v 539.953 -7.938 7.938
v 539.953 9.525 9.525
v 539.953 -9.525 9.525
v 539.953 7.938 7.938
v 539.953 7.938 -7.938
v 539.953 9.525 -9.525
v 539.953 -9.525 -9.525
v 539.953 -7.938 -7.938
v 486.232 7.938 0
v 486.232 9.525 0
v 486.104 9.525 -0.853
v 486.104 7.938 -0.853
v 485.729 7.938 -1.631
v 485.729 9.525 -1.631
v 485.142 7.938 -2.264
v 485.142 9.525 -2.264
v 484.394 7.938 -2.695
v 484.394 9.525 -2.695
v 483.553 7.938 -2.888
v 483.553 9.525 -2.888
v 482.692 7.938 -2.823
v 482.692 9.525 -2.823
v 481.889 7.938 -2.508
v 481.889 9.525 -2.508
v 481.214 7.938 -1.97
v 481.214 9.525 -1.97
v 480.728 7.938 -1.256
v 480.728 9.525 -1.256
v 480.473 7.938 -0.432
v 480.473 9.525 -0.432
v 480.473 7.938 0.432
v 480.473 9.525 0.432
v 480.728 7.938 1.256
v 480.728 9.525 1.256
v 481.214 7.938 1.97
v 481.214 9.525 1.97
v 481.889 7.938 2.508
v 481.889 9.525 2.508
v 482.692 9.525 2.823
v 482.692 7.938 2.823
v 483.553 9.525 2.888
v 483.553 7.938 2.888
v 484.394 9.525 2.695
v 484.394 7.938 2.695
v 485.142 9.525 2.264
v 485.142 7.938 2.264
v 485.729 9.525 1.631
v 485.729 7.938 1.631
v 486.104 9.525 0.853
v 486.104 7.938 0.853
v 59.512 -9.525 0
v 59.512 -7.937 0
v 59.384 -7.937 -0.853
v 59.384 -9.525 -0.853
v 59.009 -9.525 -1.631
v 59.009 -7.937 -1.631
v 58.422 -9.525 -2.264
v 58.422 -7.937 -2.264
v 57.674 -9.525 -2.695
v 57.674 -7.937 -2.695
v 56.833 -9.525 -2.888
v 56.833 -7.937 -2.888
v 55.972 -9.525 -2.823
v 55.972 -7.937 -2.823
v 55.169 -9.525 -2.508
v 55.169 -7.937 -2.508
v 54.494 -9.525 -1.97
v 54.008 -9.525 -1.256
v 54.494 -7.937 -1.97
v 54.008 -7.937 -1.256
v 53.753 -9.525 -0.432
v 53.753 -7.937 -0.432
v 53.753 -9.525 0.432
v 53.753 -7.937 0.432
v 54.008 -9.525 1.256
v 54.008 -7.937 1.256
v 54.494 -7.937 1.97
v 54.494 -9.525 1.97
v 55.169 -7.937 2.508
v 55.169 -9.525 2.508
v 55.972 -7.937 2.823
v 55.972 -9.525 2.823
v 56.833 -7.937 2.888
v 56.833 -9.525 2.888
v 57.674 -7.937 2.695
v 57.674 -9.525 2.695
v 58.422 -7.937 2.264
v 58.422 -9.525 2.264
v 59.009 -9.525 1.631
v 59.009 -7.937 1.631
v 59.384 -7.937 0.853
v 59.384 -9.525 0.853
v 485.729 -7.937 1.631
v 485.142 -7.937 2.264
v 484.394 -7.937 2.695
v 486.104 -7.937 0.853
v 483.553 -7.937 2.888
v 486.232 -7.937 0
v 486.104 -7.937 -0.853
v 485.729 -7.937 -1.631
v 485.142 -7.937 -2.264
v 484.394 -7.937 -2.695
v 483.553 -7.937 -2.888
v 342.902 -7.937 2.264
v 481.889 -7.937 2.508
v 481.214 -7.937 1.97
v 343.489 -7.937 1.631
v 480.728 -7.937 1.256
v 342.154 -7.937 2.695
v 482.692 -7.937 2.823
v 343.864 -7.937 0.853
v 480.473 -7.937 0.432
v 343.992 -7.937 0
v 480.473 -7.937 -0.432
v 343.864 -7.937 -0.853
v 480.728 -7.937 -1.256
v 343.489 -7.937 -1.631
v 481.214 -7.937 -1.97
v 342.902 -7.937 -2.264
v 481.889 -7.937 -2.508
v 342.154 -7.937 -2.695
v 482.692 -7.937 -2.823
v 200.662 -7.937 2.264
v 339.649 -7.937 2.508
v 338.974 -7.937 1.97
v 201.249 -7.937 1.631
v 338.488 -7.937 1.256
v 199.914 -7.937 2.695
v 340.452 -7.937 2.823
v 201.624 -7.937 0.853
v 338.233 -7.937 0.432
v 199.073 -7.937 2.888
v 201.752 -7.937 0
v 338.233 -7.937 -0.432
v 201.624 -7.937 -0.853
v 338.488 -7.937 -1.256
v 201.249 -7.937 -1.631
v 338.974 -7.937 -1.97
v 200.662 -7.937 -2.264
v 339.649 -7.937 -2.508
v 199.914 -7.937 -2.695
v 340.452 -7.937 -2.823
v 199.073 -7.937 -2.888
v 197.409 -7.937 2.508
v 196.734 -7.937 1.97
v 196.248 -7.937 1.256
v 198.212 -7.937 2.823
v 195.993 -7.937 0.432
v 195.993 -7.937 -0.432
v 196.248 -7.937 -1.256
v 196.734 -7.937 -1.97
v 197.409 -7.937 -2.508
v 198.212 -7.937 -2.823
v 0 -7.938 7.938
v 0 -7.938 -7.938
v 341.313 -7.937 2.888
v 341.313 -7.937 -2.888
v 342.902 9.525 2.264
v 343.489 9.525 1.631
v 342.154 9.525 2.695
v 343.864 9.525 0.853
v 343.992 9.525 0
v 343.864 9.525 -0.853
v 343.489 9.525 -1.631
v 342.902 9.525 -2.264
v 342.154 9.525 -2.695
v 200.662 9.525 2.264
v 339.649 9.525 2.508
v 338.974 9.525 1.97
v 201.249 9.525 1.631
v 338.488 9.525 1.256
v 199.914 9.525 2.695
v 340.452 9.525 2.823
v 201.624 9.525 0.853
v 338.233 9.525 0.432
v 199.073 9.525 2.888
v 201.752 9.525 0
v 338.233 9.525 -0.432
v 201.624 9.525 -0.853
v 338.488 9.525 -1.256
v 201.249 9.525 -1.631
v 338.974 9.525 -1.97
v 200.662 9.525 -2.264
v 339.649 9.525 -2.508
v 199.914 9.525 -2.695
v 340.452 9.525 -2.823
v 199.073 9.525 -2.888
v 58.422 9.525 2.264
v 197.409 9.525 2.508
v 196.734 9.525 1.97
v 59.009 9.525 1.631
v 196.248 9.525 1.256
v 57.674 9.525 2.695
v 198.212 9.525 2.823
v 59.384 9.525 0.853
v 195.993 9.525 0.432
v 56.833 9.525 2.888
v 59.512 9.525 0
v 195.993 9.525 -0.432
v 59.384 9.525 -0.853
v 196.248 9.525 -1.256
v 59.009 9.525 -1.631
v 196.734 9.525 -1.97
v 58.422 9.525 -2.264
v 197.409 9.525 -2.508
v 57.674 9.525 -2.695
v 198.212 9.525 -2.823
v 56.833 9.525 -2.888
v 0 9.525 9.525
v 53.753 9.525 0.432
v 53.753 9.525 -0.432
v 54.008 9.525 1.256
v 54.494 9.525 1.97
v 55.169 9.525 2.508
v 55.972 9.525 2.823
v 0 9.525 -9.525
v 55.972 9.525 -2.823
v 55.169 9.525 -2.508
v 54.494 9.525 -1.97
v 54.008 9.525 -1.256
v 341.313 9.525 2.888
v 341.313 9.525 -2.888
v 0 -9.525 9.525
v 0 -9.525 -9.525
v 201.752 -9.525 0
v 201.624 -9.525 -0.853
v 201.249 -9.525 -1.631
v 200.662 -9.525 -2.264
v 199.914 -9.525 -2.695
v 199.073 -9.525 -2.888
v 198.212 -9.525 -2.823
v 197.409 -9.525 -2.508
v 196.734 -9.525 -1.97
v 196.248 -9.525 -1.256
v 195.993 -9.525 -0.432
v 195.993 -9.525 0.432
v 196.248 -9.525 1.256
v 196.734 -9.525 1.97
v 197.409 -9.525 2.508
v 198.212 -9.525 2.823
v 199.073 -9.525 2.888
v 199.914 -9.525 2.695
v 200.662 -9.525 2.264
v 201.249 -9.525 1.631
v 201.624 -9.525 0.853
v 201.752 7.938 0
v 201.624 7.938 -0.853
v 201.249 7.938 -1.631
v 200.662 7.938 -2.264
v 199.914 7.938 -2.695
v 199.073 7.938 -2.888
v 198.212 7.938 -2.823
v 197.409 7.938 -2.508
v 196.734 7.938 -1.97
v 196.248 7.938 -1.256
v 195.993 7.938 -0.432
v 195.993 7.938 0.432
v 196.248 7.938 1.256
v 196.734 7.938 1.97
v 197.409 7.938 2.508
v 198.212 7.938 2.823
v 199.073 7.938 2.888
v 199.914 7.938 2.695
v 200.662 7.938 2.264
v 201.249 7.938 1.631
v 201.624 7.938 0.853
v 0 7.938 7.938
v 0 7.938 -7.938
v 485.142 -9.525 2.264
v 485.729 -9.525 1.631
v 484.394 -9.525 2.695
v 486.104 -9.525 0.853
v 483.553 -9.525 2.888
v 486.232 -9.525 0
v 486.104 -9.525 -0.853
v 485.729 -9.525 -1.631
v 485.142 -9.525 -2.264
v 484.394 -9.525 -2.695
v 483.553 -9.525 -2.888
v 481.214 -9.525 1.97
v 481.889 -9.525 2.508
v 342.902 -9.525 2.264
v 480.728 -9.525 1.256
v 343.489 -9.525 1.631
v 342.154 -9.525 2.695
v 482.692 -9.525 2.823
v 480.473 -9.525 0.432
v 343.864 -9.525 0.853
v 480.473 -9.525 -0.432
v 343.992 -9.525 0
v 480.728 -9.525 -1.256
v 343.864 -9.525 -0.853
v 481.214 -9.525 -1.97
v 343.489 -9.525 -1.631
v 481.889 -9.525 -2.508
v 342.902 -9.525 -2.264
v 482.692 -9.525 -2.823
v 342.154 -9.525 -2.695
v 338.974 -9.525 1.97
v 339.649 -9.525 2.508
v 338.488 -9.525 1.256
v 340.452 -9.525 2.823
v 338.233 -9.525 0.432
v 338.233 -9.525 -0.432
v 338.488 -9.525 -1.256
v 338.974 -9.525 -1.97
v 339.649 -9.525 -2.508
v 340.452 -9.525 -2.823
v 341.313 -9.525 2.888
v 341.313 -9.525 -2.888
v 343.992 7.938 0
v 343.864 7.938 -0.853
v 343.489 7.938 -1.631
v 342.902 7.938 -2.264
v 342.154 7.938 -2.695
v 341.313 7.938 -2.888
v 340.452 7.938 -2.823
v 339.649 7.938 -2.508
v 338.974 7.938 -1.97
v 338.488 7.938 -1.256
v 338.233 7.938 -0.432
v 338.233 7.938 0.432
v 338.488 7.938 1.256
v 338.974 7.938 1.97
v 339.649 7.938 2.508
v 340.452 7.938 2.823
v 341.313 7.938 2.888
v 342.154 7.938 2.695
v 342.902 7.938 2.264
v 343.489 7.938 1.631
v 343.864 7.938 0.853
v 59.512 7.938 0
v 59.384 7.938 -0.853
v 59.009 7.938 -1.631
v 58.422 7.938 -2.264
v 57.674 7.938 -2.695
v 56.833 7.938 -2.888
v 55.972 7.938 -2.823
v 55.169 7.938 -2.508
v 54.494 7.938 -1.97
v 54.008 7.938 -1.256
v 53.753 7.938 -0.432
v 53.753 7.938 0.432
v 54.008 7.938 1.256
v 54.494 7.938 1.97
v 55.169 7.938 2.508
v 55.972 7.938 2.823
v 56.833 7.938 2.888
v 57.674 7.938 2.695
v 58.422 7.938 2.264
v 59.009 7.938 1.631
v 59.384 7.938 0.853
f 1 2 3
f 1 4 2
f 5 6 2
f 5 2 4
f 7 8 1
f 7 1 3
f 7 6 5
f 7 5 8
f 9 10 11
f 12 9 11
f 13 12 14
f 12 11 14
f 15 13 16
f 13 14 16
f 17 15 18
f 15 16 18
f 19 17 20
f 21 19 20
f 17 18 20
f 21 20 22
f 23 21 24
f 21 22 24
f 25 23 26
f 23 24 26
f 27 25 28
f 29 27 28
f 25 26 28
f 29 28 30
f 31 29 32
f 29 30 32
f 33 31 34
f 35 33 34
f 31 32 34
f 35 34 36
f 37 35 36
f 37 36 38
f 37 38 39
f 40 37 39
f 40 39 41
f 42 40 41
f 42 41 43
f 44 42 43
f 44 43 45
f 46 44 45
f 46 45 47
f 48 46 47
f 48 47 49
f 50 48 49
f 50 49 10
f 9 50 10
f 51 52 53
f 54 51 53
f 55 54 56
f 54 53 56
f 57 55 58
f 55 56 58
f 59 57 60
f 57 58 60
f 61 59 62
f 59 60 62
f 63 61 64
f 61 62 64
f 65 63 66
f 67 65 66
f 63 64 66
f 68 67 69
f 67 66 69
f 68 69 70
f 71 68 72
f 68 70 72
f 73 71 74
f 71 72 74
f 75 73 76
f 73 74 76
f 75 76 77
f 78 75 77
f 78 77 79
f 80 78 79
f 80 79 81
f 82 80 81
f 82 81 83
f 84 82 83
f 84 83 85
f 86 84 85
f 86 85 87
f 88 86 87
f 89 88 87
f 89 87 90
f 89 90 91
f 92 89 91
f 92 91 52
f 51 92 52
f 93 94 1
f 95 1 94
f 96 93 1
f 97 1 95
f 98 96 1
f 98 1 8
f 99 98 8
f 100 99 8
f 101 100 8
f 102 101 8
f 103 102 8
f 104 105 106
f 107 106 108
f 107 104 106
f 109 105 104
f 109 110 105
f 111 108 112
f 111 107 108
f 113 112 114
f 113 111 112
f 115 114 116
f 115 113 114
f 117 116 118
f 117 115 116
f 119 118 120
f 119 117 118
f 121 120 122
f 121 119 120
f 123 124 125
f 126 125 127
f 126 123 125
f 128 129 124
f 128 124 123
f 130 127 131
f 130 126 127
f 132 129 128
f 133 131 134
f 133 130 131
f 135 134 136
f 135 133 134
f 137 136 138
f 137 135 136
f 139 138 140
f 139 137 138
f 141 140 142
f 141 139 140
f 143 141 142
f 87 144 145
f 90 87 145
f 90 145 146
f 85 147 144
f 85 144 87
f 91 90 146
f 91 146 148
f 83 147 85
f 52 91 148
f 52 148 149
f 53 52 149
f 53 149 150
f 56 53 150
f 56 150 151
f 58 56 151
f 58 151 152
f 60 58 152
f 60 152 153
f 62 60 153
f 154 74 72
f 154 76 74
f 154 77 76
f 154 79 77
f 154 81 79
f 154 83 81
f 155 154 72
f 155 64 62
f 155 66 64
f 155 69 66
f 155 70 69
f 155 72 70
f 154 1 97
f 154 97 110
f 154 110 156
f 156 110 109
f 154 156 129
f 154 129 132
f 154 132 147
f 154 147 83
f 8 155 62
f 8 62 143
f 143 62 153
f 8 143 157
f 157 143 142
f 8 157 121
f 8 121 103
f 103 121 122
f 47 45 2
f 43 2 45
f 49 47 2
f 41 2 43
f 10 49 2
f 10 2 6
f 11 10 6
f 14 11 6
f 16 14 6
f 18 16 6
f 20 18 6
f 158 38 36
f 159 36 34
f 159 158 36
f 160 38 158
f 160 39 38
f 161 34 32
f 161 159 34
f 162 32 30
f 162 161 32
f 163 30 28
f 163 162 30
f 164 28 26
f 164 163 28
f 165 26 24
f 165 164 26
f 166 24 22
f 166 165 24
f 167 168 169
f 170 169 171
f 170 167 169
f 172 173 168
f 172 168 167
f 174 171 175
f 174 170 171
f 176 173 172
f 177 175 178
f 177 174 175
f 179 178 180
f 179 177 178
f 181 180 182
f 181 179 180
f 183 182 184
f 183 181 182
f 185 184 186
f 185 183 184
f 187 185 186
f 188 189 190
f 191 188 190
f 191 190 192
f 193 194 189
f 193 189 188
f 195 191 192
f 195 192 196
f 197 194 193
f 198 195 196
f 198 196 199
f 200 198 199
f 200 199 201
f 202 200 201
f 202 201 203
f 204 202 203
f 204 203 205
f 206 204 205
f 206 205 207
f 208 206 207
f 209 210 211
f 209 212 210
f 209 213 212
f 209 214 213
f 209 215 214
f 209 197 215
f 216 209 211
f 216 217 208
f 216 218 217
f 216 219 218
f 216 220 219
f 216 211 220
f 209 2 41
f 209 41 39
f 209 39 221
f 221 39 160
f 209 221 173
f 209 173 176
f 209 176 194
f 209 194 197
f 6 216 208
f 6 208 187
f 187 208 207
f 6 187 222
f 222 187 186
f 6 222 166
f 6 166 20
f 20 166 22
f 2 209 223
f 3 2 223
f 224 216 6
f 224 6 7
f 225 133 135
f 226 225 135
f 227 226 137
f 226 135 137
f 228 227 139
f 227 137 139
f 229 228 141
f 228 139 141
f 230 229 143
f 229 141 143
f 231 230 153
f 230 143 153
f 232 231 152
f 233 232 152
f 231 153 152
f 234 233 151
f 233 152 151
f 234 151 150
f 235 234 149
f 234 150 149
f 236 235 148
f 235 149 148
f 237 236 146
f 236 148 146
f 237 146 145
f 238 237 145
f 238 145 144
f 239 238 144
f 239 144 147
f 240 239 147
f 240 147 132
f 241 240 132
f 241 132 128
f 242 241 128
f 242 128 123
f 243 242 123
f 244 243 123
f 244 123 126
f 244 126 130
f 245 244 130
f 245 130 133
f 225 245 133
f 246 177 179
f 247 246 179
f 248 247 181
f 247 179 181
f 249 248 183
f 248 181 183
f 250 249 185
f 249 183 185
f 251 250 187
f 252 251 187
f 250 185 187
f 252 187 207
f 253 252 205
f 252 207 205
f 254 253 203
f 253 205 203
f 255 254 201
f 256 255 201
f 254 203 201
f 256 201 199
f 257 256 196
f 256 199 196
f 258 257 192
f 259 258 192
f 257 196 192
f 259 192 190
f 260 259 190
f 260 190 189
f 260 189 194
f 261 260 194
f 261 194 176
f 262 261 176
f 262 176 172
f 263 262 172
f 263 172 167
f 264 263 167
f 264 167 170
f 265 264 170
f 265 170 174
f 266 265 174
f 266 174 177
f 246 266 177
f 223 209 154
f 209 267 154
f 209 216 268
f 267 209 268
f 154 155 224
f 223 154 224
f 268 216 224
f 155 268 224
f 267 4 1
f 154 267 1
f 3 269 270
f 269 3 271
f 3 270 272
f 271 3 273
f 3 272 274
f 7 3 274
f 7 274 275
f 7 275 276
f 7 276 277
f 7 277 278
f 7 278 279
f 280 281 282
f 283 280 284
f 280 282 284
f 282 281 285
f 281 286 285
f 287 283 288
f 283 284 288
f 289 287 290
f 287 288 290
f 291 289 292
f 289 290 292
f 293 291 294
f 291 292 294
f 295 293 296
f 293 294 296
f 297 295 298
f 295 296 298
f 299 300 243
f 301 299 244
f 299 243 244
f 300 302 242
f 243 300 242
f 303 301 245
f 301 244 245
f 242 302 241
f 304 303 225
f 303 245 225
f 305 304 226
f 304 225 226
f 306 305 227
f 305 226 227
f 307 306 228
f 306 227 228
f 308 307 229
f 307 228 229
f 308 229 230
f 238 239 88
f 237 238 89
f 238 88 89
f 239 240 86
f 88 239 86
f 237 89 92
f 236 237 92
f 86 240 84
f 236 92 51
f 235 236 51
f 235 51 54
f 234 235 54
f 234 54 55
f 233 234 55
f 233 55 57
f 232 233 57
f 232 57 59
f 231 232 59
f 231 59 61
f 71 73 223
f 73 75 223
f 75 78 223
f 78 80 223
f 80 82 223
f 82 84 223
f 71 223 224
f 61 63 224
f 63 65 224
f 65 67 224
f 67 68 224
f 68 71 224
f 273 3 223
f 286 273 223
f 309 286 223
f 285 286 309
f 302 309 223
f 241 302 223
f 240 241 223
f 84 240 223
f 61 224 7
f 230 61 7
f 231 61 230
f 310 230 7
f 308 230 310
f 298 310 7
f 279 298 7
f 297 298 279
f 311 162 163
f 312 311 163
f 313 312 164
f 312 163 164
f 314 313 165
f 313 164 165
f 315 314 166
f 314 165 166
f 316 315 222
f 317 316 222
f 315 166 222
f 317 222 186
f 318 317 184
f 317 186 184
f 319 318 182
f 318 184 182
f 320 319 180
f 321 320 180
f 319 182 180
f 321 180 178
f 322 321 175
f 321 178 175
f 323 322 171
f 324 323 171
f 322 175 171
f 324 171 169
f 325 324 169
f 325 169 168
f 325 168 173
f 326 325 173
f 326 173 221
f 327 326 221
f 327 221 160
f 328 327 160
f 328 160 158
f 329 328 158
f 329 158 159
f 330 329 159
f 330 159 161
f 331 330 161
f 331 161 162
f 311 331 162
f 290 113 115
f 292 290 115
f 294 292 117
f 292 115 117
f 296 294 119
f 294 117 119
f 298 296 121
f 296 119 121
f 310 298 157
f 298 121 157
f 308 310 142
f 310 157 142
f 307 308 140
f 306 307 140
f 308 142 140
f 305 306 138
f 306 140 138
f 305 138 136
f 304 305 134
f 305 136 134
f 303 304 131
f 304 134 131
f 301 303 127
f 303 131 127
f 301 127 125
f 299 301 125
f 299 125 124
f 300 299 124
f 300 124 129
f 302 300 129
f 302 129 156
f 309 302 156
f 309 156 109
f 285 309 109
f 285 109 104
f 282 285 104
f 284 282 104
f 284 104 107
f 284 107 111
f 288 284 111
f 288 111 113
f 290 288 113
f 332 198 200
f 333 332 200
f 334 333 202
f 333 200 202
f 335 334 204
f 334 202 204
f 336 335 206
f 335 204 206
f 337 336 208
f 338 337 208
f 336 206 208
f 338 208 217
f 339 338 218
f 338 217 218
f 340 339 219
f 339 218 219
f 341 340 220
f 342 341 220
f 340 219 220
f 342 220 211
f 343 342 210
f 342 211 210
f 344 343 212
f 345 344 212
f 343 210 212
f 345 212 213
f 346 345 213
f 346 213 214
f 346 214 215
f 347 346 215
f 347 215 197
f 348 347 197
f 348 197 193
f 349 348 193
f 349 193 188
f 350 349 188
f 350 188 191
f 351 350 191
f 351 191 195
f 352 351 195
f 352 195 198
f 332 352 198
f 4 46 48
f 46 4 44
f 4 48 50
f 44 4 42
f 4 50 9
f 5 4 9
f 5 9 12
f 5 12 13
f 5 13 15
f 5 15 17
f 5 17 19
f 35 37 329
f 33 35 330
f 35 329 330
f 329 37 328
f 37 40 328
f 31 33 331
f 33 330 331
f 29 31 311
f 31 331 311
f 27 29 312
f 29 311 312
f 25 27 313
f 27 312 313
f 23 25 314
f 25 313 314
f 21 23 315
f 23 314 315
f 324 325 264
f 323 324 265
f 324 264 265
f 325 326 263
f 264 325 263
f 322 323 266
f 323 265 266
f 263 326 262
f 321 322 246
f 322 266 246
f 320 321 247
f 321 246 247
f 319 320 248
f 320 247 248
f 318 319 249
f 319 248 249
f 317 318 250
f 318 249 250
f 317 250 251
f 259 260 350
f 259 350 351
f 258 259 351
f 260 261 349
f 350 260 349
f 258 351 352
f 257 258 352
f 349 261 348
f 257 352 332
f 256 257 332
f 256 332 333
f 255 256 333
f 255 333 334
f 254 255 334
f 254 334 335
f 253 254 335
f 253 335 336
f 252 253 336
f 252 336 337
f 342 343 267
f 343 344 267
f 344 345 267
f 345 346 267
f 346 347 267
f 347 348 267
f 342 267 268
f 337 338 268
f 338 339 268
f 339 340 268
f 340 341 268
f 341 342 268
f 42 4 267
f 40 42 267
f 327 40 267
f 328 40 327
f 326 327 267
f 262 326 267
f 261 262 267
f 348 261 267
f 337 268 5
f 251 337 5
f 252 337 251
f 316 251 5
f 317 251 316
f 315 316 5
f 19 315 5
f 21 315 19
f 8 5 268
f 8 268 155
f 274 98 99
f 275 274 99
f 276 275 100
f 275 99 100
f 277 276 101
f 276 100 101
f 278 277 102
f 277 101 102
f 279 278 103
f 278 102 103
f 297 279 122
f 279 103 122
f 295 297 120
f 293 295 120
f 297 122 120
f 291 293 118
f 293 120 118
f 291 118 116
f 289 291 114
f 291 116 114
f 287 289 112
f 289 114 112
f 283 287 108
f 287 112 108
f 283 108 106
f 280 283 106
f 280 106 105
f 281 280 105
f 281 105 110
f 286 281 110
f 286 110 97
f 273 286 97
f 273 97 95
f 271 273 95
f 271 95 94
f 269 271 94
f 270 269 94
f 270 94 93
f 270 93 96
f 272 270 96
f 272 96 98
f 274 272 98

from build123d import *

# Parameters (mm, degrees)
SKETCH1_W               = 19.05
SKETCH1_H               = 19.05
SKETCH1_W_2             = 15.875
SKETCH1_H_2             = 15.875
TUBE_DEPTH              = 539.9532
SKETCH3_R               = 2.8956
REARTOPHOLEMASTER_DEPTH = 20.05
LPATTERN2_COUNT         = 4
LPATTERN2_PITCH         = 142.24


with BuildPart() as part:
    # Sketch1 → Tube (new body)
    with BuildSketch(Plane(origin=(0, 0, 0), x_dir=(0, -1, 0), z_dir=(1, 0, 0))):
        Rectangle(SKETCH1_W, SKETCH1_H)
        Rectangle(SKETCH1_W_2, SKETCH1_H_2, mode=Mode.SUBTRACT)
    extrude(amount=TUBE_DEPTH)

    # Sketch3 → RearTopHoleMaster (cut, through all)
    with BuildSketch(Plane(origin=(0, 9.525, 0), x_dir=(1, 0, 0), z_dir=(0, 1, 0))):
        with Locations((56.6166, 0)):
            Circle(SKETCH3_R)
    reartopholemaster = extrude(amount=-REARTOPHOLEMASTER_DEPTH, mode=Mode.SUBTRACT)

    # LPattern2: RearTopHoleMaster ×4
    with Locations(*[(i * LPATTERN2_PITCH, 0, 0) for i in range(1, LPATTERN2_COUNT)]):
        add(reartopholemaster, mode=Mode.SUBTRACT)


solid = part.part
